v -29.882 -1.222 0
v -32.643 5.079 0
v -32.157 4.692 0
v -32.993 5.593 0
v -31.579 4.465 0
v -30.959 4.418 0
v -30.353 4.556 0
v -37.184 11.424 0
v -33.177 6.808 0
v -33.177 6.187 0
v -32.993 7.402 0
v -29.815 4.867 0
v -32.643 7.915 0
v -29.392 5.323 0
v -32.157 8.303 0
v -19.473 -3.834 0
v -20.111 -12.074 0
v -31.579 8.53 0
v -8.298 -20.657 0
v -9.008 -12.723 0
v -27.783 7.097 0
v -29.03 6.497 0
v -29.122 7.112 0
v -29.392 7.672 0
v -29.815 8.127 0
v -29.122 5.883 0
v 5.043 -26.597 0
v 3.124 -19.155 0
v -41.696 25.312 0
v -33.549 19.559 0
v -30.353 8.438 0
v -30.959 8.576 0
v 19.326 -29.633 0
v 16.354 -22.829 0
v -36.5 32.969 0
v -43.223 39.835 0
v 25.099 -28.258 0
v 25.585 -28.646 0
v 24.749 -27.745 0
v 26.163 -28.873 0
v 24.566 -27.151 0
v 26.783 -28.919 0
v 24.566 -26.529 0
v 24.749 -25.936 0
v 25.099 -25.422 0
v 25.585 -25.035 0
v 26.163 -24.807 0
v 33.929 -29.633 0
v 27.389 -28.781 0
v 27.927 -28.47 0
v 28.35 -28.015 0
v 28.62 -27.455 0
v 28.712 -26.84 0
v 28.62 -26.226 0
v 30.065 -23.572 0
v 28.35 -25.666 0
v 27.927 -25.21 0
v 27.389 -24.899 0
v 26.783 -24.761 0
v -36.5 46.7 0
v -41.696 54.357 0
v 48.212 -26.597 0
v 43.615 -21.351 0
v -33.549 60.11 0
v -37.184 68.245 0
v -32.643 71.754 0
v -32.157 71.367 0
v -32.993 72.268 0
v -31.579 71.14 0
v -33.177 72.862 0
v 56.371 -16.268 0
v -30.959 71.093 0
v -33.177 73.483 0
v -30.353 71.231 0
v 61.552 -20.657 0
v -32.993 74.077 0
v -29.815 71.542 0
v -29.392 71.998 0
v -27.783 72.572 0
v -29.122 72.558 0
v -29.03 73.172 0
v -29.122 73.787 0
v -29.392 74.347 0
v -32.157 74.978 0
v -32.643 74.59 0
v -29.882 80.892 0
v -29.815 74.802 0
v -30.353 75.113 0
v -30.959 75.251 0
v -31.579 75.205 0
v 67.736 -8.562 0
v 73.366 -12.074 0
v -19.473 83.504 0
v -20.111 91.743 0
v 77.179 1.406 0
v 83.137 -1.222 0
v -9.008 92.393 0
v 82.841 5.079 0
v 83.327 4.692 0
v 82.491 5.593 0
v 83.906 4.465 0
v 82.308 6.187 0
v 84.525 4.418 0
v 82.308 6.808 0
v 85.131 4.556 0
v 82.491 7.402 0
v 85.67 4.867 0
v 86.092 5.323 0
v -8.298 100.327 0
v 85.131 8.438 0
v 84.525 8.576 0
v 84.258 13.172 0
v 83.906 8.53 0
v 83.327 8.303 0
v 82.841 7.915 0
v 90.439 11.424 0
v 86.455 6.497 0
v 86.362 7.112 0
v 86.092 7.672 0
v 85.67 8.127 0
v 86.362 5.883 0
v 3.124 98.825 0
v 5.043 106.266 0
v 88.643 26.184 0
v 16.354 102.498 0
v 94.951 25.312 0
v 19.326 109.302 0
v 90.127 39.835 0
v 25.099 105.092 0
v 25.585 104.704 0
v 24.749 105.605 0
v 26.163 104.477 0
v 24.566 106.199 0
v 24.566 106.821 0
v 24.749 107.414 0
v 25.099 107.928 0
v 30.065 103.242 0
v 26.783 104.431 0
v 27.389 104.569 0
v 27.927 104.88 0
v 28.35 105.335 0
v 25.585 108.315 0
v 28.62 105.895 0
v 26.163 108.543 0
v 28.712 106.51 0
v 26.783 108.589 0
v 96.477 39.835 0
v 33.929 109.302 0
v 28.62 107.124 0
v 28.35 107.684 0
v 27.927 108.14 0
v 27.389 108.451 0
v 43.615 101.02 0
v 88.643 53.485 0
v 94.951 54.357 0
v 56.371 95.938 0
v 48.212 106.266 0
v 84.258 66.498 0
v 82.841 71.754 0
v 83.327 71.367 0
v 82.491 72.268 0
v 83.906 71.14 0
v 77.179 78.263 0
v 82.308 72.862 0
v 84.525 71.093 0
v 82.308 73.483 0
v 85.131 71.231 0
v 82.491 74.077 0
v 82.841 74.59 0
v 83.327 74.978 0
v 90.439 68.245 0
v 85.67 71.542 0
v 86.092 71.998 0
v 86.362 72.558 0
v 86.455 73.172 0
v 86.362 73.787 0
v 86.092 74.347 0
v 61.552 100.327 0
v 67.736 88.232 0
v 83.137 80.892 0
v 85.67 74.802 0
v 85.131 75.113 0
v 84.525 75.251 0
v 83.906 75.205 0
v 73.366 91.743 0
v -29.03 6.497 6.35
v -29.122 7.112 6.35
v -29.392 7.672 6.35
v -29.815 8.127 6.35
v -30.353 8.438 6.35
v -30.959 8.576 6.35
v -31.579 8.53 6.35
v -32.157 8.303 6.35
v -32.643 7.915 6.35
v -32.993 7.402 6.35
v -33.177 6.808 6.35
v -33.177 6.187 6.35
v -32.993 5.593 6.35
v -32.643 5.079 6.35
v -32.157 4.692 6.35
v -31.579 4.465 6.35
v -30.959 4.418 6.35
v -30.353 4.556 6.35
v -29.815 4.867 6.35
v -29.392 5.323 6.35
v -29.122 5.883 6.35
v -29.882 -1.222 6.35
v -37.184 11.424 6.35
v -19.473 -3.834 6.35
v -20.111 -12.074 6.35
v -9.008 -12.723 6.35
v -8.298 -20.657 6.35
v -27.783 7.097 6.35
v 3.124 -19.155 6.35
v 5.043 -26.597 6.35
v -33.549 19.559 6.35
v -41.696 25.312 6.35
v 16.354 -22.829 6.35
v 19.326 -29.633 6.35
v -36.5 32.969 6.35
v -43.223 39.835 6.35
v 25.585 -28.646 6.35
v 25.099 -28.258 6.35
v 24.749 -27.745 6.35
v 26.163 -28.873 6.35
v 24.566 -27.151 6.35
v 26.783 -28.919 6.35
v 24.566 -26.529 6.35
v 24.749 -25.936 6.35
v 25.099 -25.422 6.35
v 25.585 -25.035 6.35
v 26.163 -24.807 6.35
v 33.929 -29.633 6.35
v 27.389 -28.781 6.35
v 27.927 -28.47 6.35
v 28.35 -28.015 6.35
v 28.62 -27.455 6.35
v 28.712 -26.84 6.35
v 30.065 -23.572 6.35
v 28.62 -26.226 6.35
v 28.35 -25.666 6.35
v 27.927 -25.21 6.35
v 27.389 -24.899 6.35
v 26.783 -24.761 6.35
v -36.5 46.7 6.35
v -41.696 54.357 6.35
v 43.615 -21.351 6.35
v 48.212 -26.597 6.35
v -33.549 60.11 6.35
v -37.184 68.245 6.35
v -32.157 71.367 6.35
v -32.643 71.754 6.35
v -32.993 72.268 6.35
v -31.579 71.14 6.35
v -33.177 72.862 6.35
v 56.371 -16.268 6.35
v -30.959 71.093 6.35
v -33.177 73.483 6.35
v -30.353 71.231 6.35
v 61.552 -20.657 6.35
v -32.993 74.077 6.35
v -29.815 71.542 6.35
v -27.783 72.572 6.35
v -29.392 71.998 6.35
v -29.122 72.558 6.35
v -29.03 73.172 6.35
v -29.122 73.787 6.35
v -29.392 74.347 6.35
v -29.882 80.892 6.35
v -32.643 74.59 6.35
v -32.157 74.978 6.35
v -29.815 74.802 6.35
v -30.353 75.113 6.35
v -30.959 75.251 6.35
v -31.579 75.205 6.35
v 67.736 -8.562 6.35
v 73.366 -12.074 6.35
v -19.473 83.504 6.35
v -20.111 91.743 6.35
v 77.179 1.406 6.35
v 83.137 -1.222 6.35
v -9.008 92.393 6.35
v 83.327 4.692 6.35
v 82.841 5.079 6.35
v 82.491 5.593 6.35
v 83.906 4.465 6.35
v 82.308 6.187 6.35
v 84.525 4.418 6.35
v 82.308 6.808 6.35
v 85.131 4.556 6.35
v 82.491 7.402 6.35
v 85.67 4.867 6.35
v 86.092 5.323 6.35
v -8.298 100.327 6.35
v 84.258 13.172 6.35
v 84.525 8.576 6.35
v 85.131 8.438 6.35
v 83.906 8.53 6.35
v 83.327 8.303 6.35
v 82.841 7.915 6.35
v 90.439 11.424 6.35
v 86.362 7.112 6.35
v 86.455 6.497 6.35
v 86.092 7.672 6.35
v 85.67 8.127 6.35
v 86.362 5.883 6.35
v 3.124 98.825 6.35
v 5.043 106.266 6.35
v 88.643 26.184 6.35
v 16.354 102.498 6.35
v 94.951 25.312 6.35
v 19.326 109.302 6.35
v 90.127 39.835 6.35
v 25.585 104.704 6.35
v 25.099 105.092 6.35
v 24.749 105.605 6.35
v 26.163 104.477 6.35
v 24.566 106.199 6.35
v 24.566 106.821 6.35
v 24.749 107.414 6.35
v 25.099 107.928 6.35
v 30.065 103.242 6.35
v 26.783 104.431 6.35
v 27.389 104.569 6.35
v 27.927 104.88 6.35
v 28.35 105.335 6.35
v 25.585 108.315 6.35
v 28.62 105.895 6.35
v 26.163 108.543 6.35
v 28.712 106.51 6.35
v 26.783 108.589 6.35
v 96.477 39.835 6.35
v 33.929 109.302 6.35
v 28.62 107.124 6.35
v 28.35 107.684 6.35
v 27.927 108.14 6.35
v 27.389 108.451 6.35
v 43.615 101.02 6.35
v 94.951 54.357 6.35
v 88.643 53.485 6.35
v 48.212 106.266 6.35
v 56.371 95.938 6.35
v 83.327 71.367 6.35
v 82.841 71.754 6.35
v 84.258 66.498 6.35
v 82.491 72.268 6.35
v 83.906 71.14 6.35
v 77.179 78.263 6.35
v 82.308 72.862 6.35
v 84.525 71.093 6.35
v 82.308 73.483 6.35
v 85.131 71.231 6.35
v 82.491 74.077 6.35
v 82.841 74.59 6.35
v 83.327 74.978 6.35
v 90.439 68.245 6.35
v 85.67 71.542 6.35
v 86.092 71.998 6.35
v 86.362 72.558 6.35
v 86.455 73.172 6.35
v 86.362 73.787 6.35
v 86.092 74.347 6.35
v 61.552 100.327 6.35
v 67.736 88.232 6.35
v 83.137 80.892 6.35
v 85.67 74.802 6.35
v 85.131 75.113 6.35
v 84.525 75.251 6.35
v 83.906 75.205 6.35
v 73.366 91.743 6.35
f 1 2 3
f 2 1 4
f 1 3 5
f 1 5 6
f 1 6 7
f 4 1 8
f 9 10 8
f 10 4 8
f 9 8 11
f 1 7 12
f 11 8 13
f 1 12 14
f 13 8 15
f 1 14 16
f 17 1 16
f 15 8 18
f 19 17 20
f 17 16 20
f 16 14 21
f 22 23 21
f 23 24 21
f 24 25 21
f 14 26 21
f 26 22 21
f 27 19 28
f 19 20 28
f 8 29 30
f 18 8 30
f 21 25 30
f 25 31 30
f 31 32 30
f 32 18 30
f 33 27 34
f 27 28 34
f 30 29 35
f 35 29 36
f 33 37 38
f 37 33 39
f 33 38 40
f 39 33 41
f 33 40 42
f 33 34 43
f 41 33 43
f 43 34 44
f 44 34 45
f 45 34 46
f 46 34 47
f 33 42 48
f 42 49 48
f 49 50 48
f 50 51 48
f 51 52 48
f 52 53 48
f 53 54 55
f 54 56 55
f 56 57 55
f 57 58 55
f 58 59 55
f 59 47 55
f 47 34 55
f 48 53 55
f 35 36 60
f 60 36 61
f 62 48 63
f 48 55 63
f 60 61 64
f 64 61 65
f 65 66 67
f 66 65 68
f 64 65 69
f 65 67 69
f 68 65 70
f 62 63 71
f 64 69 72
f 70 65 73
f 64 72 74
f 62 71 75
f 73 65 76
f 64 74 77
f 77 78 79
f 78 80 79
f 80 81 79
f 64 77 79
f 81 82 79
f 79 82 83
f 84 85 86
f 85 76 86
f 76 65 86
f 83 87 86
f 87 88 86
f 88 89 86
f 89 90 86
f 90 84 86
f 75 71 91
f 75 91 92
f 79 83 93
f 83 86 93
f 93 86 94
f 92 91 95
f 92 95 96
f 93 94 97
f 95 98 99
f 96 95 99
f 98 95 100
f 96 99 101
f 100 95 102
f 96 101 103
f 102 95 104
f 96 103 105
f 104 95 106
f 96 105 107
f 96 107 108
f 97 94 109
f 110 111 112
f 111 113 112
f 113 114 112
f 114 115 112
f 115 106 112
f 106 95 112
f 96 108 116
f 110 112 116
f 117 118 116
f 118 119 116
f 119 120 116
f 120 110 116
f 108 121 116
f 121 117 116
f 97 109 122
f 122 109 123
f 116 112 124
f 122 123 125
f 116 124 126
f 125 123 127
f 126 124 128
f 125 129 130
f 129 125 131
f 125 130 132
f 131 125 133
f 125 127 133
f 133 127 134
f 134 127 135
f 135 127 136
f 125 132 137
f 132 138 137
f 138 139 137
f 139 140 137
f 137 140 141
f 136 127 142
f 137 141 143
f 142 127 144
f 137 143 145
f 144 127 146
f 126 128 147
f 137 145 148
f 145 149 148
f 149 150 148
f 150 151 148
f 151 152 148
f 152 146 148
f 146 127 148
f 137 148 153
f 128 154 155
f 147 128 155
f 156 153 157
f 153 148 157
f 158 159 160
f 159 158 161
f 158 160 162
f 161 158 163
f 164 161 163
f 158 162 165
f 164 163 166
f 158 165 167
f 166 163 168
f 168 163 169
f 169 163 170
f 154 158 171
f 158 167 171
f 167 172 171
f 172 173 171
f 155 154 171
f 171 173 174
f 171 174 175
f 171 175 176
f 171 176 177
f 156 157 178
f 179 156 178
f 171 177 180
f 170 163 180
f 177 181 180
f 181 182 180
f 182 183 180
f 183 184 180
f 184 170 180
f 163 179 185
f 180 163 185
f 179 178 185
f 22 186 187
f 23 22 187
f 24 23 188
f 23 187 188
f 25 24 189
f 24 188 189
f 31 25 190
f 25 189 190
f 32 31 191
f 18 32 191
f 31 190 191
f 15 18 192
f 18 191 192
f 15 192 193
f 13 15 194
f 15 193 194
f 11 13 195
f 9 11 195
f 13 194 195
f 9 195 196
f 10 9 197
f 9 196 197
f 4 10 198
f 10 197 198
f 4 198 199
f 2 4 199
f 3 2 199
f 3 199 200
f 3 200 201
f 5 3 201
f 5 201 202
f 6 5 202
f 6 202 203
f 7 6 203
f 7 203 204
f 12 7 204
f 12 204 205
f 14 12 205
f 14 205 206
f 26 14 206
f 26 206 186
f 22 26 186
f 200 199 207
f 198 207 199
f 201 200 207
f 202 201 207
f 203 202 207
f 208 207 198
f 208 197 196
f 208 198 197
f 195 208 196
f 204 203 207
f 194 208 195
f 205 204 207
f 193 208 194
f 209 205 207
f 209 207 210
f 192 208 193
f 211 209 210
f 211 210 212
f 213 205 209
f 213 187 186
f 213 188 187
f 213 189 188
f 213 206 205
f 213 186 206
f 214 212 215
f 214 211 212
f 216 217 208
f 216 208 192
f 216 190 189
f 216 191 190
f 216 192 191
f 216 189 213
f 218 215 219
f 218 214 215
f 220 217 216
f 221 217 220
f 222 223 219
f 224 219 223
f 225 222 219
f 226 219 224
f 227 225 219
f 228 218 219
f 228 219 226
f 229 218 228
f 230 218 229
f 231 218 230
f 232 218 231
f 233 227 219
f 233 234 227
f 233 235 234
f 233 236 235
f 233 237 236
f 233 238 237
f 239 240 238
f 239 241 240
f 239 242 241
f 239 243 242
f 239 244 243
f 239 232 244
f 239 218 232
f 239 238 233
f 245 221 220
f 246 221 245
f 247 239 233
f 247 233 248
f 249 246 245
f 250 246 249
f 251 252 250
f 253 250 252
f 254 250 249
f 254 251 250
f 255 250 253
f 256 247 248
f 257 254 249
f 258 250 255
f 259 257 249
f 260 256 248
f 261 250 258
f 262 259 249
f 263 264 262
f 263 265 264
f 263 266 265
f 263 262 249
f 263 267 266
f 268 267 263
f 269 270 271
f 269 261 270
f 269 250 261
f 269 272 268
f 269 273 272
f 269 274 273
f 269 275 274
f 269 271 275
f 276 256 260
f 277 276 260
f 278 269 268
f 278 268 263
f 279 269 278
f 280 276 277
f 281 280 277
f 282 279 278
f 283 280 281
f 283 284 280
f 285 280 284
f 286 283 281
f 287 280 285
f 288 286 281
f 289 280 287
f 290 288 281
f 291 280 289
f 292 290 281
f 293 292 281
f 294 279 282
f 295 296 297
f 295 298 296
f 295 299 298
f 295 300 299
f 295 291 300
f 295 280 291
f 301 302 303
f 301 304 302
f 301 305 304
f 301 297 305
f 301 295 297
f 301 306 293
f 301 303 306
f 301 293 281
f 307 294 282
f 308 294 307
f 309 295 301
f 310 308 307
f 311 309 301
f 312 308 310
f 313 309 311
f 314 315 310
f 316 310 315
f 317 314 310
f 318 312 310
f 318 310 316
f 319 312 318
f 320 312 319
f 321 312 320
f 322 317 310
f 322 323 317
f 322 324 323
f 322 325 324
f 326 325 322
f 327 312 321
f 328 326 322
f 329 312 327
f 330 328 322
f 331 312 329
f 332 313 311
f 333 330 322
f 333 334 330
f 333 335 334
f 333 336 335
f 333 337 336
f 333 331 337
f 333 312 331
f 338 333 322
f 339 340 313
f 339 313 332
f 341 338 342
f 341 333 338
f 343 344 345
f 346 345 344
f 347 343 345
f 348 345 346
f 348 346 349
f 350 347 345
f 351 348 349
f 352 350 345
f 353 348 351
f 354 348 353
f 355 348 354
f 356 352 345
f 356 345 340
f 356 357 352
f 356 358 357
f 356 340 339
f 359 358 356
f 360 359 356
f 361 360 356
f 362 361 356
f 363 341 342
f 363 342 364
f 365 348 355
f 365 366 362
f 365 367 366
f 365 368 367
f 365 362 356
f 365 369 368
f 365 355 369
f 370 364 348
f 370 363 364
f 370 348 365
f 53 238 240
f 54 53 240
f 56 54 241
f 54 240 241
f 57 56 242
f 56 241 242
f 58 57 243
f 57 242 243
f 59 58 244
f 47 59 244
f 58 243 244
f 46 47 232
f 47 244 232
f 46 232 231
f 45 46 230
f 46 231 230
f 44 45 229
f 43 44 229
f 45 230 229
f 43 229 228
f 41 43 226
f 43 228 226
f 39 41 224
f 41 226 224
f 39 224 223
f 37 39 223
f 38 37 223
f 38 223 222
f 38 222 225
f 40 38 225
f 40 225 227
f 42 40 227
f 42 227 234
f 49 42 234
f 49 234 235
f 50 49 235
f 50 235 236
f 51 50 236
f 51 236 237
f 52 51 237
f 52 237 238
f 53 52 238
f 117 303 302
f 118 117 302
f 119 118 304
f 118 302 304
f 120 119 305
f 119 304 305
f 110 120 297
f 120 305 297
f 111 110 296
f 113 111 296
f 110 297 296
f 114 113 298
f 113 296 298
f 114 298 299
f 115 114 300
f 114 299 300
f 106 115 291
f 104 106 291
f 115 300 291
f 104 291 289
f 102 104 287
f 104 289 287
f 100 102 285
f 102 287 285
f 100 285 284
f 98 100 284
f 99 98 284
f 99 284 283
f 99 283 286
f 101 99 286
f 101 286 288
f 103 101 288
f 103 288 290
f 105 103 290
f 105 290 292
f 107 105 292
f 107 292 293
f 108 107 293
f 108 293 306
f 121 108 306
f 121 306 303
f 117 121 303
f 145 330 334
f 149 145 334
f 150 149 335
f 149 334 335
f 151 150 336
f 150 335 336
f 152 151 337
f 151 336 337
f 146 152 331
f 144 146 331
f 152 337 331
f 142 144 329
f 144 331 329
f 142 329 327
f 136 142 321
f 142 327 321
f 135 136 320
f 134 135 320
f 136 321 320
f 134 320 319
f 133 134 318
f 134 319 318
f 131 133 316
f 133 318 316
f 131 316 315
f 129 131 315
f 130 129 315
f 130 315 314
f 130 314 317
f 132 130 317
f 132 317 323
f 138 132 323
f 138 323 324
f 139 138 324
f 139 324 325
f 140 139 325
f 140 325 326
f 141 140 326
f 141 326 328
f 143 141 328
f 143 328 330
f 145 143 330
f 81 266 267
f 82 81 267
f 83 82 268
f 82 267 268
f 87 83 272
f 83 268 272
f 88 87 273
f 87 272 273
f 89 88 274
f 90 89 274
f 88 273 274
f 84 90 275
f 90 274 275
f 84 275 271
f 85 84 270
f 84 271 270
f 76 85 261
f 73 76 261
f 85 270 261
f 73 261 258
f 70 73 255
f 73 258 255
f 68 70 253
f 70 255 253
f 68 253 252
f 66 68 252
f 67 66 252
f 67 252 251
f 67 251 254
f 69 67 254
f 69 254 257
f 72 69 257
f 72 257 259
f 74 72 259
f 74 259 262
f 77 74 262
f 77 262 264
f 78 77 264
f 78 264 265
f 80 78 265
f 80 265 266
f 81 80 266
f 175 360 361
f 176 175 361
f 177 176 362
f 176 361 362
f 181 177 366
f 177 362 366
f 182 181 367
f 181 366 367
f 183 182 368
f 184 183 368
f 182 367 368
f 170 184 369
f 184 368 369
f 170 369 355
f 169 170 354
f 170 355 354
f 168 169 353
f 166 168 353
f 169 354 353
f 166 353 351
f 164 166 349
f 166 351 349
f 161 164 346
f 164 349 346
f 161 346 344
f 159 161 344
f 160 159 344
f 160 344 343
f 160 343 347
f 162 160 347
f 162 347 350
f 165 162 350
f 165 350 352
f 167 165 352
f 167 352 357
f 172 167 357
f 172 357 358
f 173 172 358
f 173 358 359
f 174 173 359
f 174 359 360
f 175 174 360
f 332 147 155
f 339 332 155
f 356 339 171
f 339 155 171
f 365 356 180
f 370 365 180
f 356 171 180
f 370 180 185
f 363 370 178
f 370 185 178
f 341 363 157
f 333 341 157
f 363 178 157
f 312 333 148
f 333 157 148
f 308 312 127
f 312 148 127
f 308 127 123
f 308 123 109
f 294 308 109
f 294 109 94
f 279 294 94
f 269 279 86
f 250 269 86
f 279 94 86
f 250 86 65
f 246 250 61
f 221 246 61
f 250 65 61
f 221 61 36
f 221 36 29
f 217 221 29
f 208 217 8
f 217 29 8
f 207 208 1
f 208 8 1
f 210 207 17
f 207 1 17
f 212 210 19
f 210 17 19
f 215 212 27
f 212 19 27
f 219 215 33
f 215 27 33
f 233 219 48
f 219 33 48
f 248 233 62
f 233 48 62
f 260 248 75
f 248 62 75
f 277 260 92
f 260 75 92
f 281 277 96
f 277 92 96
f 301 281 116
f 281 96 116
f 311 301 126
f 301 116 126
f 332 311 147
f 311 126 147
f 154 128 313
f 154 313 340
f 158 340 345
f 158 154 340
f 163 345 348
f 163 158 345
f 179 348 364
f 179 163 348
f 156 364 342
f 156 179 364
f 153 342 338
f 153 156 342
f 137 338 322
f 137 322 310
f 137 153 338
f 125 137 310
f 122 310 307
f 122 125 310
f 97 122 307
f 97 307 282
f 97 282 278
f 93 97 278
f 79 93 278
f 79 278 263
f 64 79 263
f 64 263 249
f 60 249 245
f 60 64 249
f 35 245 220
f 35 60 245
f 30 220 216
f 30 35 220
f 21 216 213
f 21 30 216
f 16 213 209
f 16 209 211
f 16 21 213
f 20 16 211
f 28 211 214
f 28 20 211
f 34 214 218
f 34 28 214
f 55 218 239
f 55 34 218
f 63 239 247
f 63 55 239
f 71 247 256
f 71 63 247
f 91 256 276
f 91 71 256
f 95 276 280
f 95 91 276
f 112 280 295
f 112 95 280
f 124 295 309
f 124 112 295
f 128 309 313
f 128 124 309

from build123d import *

# Parameters (mm, degrees)
SKETCH1_R           = 69.85
SKETCH1_R_2         = 63.5
BOSS_EXTRUDE1_DEPTH = 6.35
SKETCH2_R           = 2.085
CUT_EXTRUDE1_DEPTH  = 21.336


with BuildPart() as part:
    # Sketch1 → Boss-Extrude1 (new body)
    with BuildSketch(Plane.XY):
        with Locations((26.627424347, 39.834794984)):
            Circle(SKETCH1_R)
        with Locations((26.627424347, 39.834794984)):
            Circle(SKETCH1_R_2, mode=Mode.SUBTRACT)
    extrude(amount=BOSS_EXTRUDE1_DEPTH)

    # Sketch2 → Cut-Extrude1 (cut)
    with BuildSketch(Plane.XY.offset(6.35)):
        with Locations((26.627424347, 106.509794984)):
            Circle(SKETCH2_R)
        with Locations((84.369668144, 73.172294984)):
            Circle(SKETCH2_R)
        with Locations((84.369668144, 6.497294984)):
            Circle(SKETCH2_R)
        with Locations((26.627424347, -26.840205016)):
            Circle(SKETCH2_R)
        with Locations((-31.11481945, 6.497294984)):
            Circle(SKETCH2_R)
        with Locations((-31.11481945, 73.172294984)):
            Circle(SKETCH2_R)
    extrude(amount=-CUT_EXTRUDE1_DEPTH, mode=Mode.SUBTRACT)


solid = part.part
